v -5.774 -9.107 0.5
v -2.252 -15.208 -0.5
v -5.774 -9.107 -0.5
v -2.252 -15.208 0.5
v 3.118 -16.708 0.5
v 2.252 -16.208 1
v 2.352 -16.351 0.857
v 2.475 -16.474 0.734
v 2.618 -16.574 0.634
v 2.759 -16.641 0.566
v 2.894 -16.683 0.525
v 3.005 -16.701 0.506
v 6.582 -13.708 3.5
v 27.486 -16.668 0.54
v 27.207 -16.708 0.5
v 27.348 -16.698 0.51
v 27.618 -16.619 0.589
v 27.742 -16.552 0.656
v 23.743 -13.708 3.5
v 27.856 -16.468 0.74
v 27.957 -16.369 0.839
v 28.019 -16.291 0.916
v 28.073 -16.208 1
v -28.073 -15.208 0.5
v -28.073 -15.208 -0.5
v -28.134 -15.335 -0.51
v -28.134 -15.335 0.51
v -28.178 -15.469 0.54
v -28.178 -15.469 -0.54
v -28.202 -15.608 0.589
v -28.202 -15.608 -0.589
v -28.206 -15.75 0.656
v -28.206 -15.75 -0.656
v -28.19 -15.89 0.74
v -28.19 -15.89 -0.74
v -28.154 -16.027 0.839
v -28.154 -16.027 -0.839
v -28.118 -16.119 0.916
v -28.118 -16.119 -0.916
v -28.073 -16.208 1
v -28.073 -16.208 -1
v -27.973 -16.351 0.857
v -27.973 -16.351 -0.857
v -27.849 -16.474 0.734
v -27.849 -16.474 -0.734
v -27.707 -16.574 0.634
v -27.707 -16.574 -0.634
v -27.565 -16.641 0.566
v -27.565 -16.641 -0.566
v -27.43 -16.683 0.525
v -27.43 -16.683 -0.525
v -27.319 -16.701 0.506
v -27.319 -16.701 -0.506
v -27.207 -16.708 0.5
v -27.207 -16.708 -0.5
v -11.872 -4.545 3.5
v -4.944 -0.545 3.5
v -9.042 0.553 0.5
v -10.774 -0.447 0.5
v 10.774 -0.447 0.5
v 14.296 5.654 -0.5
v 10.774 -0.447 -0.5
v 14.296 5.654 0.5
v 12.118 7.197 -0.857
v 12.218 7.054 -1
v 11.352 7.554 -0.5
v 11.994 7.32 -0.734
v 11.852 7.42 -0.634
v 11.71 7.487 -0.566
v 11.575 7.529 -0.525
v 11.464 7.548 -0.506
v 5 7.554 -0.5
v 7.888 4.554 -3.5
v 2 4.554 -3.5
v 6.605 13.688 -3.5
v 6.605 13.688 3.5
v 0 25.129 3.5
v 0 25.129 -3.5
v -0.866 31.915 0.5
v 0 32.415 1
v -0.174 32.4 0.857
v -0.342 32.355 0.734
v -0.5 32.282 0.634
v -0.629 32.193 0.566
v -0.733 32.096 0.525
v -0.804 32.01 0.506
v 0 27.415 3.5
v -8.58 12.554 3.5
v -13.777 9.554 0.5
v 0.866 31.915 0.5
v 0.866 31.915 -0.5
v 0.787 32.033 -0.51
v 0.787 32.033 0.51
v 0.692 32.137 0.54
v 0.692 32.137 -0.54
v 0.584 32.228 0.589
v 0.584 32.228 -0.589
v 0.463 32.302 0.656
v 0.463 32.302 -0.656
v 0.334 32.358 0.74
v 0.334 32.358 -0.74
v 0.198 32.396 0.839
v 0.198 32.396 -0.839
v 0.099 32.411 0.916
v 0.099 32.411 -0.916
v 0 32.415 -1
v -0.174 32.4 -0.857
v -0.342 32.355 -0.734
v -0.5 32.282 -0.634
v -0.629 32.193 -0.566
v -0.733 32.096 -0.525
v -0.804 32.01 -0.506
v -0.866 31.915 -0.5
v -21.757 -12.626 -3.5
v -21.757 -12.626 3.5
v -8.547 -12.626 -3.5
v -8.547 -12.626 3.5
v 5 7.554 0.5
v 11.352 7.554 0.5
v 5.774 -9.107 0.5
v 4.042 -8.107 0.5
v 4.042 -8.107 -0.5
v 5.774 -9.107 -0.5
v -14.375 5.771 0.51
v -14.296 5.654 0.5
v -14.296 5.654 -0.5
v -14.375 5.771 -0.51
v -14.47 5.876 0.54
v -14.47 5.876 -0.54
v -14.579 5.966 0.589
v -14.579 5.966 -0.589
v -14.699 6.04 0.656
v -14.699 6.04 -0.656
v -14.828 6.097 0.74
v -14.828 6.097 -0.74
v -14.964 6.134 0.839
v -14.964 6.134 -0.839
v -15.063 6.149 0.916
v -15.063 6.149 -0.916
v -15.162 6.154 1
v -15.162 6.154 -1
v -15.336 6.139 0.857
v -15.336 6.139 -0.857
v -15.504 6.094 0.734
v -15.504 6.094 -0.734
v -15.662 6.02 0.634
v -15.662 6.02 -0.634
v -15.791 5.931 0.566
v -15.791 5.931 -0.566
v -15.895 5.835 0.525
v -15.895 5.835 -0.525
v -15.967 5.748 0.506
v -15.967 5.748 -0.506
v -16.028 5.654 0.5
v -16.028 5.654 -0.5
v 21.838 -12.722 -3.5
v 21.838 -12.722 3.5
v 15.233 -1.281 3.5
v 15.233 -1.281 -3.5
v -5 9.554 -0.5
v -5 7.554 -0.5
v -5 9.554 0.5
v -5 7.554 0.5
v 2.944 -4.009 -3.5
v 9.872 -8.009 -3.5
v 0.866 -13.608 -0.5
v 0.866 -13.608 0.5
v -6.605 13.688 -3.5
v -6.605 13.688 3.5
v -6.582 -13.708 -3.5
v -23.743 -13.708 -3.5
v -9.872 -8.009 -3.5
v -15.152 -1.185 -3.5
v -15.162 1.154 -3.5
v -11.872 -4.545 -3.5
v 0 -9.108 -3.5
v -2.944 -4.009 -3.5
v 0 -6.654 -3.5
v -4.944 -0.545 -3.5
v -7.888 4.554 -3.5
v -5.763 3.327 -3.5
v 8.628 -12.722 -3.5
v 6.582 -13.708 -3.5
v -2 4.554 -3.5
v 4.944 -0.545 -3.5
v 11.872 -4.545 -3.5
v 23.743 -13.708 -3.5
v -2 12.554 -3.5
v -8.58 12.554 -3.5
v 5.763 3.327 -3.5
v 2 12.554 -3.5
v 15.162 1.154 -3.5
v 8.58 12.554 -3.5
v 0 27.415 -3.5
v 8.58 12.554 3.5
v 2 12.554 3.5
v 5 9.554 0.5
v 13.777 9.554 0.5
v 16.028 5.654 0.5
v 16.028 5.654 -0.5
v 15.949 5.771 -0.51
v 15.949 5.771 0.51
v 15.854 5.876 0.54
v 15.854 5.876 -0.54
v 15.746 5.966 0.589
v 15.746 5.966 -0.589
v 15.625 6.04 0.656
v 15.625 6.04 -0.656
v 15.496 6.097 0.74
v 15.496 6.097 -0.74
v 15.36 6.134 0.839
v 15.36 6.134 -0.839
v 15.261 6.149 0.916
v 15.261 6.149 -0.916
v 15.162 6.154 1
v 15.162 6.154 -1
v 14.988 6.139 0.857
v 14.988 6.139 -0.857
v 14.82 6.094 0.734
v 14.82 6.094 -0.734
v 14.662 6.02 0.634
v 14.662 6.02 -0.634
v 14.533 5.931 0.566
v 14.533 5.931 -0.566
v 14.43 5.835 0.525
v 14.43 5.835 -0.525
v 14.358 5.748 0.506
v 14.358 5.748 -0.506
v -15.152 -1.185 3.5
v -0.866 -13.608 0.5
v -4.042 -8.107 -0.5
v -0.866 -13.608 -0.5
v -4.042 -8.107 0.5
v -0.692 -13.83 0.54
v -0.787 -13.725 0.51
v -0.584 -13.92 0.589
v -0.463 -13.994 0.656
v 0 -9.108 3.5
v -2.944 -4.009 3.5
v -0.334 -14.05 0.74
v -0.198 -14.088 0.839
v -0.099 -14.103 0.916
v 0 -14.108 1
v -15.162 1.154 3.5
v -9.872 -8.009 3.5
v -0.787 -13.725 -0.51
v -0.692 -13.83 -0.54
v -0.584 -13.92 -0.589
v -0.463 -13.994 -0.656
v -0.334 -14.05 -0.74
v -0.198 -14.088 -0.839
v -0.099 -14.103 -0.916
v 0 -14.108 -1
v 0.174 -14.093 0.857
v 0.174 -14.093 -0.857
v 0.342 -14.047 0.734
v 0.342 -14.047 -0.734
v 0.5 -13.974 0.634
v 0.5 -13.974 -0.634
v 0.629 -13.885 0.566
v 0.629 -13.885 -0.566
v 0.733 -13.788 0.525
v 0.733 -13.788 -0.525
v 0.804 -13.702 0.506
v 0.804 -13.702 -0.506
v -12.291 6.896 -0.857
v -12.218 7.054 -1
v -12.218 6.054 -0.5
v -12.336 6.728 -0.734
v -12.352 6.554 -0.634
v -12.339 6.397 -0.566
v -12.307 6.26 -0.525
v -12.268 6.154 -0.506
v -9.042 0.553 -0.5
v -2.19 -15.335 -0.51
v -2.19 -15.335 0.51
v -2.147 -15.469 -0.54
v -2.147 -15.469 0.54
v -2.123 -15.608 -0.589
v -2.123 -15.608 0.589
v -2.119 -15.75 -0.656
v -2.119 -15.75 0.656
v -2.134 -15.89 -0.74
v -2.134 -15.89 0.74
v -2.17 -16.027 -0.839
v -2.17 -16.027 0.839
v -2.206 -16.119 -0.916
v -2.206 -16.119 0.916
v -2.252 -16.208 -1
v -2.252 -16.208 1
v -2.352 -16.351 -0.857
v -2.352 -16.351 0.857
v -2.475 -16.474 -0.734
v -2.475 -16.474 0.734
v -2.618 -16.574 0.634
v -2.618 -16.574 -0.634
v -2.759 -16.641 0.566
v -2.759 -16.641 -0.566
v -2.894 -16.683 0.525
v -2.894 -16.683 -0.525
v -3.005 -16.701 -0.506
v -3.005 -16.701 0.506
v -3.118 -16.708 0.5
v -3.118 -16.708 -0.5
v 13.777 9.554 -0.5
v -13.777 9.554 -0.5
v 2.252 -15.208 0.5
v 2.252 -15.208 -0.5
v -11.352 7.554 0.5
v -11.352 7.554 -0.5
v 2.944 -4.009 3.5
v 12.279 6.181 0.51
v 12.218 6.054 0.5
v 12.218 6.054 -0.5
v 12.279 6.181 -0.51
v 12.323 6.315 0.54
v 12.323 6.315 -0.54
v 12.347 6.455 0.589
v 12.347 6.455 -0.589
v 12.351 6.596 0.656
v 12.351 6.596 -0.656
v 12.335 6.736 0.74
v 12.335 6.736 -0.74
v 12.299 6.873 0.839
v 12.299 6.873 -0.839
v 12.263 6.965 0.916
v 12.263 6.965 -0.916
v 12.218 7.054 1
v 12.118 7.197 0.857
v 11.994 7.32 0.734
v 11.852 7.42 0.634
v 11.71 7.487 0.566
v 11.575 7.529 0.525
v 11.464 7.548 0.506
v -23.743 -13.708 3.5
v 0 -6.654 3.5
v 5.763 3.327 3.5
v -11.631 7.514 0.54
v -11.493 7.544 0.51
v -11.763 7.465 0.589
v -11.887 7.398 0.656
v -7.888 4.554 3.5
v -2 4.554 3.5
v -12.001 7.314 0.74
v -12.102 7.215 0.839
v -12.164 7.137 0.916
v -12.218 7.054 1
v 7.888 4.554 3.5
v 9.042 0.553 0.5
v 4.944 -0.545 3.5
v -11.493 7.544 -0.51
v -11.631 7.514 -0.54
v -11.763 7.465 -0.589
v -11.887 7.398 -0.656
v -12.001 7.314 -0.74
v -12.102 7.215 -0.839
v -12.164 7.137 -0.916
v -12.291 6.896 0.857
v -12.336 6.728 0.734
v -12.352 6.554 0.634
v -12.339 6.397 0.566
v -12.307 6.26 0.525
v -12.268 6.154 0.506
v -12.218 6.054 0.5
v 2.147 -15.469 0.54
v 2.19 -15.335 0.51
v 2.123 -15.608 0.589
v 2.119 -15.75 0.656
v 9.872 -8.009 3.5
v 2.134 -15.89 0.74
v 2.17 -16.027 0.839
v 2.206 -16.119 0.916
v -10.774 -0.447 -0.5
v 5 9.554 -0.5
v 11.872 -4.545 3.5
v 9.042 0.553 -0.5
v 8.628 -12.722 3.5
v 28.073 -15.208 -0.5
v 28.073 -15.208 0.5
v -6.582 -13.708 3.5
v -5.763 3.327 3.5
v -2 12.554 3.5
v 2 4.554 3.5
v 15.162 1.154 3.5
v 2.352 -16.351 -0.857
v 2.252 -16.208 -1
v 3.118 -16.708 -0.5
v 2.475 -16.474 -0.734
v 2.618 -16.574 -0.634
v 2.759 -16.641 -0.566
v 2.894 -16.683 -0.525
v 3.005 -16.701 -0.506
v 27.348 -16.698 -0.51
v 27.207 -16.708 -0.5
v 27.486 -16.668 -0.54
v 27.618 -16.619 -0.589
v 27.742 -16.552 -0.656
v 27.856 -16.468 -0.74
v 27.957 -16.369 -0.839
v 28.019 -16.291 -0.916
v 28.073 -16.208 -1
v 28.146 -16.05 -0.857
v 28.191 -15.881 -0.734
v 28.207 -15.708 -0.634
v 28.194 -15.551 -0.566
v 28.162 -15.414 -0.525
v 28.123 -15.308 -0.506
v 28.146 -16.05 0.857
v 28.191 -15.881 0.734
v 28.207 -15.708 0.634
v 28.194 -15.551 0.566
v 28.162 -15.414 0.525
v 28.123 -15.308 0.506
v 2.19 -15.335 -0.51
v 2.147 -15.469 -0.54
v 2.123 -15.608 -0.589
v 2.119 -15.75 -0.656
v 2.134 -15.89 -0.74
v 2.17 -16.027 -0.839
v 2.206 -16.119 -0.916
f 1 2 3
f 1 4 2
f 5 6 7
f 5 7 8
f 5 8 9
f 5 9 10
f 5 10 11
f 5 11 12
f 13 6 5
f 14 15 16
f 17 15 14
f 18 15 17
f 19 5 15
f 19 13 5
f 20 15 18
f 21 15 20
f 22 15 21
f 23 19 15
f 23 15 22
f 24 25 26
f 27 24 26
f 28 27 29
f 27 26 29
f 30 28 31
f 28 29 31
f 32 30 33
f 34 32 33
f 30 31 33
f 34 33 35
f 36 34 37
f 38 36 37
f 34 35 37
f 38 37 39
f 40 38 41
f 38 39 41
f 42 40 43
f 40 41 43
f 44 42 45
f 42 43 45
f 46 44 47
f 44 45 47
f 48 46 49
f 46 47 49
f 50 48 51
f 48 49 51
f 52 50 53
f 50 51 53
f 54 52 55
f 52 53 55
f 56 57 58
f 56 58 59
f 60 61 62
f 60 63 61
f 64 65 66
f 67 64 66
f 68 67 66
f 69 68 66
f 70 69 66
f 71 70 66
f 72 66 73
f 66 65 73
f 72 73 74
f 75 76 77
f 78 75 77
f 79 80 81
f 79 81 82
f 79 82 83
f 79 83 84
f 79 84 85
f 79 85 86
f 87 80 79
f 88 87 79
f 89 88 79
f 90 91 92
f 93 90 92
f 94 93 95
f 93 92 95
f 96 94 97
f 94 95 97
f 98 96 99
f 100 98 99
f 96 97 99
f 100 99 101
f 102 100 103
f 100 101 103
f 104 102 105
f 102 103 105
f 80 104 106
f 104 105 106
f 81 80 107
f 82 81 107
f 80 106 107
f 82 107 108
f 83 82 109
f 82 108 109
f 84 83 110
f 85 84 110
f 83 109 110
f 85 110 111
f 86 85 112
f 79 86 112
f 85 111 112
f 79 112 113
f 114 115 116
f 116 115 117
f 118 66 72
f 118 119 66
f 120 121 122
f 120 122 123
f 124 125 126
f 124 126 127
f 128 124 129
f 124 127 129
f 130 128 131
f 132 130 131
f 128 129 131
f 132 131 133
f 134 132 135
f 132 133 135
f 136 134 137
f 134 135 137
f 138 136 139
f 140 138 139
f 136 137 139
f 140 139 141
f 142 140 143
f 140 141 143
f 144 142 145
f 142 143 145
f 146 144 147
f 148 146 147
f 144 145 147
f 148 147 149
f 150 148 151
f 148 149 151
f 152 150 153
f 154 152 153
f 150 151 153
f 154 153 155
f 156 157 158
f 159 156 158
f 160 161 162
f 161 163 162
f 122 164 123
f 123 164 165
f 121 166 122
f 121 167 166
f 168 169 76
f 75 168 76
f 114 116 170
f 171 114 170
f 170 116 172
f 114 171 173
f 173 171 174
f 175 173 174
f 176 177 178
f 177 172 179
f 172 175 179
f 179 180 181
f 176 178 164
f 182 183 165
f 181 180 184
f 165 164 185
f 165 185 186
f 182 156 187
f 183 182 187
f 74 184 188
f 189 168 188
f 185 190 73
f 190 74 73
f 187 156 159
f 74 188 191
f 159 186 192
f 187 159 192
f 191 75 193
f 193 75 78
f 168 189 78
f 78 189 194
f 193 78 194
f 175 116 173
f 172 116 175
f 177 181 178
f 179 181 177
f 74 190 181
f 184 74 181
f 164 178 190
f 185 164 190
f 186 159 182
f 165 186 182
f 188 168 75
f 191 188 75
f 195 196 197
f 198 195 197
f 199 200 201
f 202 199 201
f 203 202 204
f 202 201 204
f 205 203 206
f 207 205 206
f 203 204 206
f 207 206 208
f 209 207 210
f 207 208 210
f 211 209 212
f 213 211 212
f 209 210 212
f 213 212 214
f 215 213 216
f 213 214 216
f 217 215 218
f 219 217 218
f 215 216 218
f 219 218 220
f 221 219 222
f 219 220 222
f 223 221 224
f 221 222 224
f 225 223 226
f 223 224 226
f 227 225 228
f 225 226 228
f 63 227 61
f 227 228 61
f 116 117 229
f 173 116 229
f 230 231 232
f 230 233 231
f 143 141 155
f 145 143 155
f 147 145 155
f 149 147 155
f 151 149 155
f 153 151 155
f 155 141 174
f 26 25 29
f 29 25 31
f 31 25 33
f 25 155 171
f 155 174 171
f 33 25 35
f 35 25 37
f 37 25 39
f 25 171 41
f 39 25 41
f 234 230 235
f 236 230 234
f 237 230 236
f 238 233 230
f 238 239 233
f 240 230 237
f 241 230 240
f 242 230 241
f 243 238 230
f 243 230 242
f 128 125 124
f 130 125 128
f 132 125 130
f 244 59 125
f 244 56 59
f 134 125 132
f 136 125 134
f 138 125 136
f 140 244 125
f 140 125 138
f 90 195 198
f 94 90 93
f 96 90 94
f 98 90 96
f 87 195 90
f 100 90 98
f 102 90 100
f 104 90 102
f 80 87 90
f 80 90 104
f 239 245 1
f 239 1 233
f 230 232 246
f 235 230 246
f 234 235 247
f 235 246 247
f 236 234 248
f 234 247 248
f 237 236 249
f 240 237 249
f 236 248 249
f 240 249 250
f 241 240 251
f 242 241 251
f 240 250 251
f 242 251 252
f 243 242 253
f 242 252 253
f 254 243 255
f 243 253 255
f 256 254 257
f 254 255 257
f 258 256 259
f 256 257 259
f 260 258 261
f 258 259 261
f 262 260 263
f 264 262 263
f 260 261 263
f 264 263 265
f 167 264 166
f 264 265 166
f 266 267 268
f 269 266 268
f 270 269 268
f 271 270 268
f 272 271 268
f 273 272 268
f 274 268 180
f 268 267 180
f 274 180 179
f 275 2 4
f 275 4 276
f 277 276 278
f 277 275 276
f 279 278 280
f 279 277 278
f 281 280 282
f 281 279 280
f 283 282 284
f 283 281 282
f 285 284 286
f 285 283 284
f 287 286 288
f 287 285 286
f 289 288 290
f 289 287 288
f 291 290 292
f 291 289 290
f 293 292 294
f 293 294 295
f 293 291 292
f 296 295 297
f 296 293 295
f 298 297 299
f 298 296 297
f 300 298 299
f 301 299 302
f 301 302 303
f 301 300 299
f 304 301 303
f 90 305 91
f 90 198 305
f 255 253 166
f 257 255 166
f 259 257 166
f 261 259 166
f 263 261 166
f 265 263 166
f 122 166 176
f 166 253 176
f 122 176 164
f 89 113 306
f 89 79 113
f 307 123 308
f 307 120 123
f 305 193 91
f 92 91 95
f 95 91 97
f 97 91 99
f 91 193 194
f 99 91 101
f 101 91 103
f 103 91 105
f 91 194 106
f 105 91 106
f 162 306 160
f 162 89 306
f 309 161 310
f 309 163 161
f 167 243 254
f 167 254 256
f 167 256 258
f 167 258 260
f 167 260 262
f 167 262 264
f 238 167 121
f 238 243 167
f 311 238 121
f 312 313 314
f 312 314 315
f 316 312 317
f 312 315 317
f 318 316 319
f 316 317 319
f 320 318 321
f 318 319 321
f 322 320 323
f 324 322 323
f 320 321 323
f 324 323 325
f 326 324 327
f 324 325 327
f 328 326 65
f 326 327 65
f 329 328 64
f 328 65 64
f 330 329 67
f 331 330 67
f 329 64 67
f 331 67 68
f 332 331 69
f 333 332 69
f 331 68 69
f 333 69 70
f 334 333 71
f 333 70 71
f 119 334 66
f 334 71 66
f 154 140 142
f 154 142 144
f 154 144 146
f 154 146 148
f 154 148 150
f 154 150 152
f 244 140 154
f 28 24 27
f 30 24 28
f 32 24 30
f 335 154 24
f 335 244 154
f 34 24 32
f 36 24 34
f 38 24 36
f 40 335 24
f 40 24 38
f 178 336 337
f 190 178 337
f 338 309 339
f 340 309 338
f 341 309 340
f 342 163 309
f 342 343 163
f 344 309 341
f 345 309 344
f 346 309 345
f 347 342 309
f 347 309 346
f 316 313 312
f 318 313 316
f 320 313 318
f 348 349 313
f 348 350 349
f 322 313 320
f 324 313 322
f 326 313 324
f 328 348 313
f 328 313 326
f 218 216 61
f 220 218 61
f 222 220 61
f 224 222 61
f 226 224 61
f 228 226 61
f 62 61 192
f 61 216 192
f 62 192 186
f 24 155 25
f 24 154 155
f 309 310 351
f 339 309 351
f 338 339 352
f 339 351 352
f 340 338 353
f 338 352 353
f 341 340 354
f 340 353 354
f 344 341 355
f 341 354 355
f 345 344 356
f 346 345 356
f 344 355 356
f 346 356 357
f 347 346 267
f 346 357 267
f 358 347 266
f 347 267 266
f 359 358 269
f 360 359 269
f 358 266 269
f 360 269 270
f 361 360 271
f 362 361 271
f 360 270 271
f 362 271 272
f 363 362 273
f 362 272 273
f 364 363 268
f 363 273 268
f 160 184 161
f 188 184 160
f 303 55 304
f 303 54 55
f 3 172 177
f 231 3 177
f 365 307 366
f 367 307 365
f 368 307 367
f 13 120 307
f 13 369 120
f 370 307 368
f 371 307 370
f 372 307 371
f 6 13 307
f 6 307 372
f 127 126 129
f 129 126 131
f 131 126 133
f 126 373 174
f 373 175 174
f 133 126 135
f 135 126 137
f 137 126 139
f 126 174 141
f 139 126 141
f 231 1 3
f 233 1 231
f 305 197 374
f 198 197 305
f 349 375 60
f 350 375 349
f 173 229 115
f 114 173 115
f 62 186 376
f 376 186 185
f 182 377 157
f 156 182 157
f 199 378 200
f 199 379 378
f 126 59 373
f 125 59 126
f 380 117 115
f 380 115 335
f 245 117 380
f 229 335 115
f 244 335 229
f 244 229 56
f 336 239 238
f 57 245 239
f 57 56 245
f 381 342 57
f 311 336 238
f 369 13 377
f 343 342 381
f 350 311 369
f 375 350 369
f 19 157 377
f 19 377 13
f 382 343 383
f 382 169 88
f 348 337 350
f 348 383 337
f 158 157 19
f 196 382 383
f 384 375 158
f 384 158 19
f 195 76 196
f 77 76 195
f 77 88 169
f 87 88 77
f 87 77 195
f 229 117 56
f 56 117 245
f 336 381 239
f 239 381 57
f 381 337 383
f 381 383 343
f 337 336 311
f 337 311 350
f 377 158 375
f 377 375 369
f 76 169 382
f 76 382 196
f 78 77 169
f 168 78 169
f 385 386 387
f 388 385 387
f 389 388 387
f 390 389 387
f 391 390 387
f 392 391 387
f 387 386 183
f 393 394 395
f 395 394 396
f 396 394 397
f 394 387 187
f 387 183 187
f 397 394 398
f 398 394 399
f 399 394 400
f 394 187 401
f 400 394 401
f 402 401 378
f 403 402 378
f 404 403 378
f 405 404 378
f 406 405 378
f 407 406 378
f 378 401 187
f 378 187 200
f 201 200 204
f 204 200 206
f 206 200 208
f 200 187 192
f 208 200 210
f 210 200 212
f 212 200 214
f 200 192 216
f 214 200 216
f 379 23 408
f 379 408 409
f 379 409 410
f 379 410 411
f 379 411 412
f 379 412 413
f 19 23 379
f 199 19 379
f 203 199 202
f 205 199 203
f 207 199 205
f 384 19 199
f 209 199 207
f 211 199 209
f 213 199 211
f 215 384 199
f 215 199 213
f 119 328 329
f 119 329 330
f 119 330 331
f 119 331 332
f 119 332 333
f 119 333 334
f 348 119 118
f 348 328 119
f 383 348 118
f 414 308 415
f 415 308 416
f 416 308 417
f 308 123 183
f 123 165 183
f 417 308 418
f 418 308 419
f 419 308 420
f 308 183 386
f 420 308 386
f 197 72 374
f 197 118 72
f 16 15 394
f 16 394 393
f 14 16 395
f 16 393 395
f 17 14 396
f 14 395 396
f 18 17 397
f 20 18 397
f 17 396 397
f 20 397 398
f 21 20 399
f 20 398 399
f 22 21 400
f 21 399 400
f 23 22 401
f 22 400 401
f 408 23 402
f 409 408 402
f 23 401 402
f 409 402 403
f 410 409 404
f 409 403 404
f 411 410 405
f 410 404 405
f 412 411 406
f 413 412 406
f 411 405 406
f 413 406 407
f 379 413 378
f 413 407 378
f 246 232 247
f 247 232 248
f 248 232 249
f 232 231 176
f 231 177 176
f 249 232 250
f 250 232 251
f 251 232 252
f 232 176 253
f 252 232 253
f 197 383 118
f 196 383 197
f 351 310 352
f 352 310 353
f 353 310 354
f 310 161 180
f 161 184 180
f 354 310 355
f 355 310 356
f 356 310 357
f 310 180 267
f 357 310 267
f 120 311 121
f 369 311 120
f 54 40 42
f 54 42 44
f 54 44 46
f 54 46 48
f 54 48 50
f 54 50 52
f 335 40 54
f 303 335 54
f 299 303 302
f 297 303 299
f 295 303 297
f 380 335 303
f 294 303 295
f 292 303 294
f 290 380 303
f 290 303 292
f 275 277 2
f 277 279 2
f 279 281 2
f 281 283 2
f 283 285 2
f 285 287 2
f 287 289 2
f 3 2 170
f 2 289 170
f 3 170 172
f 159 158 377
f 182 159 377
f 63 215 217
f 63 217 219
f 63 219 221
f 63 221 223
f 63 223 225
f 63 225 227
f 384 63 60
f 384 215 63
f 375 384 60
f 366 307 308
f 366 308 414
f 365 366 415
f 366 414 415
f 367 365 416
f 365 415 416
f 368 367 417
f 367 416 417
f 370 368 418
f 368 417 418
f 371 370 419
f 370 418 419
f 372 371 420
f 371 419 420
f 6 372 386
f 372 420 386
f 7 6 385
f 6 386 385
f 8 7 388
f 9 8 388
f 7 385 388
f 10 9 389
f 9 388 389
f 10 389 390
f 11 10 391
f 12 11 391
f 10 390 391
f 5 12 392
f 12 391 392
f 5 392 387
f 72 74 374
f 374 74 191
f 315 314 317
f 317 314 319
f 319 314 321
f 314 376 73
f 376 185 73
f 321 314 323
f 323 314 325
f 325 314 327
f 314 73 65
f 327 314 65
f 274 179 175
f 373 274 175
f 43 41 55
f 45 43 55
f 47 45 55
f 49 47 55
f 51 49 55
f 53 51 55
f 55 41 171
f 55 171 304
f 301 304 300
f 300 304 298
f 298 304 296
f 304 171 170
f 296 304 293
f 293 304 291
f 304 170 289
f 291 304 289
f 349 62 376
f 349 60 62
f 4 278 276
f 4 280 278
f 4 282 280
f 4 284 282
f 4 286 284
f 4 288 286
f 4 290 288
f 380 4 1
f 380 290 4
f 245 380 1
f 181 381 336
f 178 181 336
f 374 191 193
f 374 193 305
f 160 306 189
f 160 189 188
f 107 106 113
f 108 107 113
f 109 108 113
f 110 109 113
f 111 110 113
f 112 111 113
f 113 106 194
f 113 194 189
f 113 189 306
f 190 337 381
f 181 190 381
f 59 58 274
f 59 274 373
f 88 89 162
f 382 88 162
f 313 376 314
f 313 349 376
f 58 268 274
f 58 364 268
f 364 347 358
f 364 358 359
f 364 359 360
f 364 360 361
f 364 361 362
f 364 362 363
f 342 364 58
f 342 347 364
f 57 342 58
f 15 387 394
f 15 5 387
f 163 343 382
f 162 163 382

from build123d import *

# Parameters (mm, degrees)
F0_W     = 5
F0_H     = 2
F1_DEPTH = 3.5
F2_SIZE  = 3
F3_R     = 1
F6_DEPTH = 9.2


with BuildPart() as f1:
    # F0 (on Top) → F1 (new body)
    with BuildSketch(Plane.XY):
        Polygon((-4.0418434781, -8.107062112), (0, -15.1077403724), (0, 7.5538701862), (-5, 7.5538701862), (-13.0836869563, 7.5538701862), (-9.0418434781, 0.5531919258), (-6.5418434781, -3.7769350931), align=None)
        Polygon((0, 7.5538701862), (0, -15.1077403724), (4.0418434781, -8.107062112), (6.5418434781, -3.7769350931), (9.0418434781, 0.5531919258), (13.0836869563, 7.5538701862), (5, 7.5538701862), align=None)
        Polygon((-10.7738942857, -0.4468080742), (-8.2738942857, -4.7769350931), (-6.5418434781, -3.7769350931), (-9.0418434781, 0.5531919258), align=None)
        Polygon((-8.2738942857, -4.7769350931), (-5.7738942857, -9.107062112), (-4.0418434781, -8.107062112), (-6.5418434781, -3.7769350931), align=None)
        Polygon((8.2738942857, -4.7769350931), (10.7738942857, -0.4468080742), (9.0418434781, 0.5531919258), (6.5418434781, -3.7769350931), align=None)
        Polygon((4.0418434781, -8.107062112), (5.7738942857, -9.107062112), (8.2738942857, -4.7769350931), (6.5418434781, -3.7769350931), align=None)
        with Locations((2.5, 8.5538701862)):
            Rectangle(F0_W, F0_H)
        with Locations((-2.5, 8.5538701862)):
            Rectangle(F0_W, F0_H)
        Polygon((-28.9386550611, -16.7077402895), (-1.3856406939, -16.7077402895), (-5.7738942857, -9.107062112), (-8.2738942857, -4.7769350931), (-10.7738942857, -0.4468080742), (-15.1621478775, 7.1538701033), align=None)
        Polygon((5.7738942857, -9.107062112), (1.3856406939, -16.7077402895), (28.9386550611, -16.7077402895), (15.1621478775, 7.1538701033), (10.7738942857, -0.4468080742), (8.2738942857, -4.7769350931), align=None)
        Polygon((5, 9.5538701862), (13.7765071836, 9.5538701862), (0, 33.415480579), (0, 9.5538701862), align=None)
        Polygon((0, 9.5538701862), (0, 33.415480579), (-13.7765071836, 9.5538701862), (-5, 9.5538701862), align=None)
    extrude(amount=F1_DEPTH)

    # F2
    f2_edges = [f1.edges().sort_by_distance(p)[0] for p in [
        (-11.062765, 4.053531, 3.5),
        (-9.907869, 0.053192, 3.5),
        (-12.968021, 3.353531, 3.5),
        (-22.050401, -4.776935, 3.5),
        (-15.162148, -16.70774, 3.5),
        (-3.579767, -12.907401, 3.5),
        (-4.907869, -8.607062, 3.5),
        (-2.020922, -11.607401, 3.5),
        (2.020922, -11.607401, 3.5),
        (4.907869, -8.607062, 3.5),
        (3.579767, -12.907401, 3.5),
        (15.162148, -16.70774, 3.5),
        (22.050401, -4.776935, 3.5),
        (12.968021, 3.353531, 3.5),
        (9.907869, 0.053192, 3.5),
        (11.062765, 4.053531, 3.5),
        (9.041843, 7.55387, 3.5),
        (5, 8.55387, 3.5),
        (9.388254, 9.55387, 3.5),
        (6.888254, 21.484675, 3.5),
        (-6.888254, 21.484675, 3.5),
        (-9.388254, 9.55387, 3.5),
        (-5, 8.55387, 3.5),
        (-9.041843, 7.55387, 3.5),
    ]]
    chamfer(f2_edges, length=F2_SIZE)

    # F3
    f3_edges = [f1.edges().sort_by_distance(p)[0] for p in [
        (-28.938655, -16.70774, 0.25),
        (28.938655, -16.70774, 0.25),
        (0, 33.415481, 0.25),
        (-15.162148, 7.15387, 0.25),
        (15.162148, 7.15387, 0.25),
        (-1.385641, -16.70774, 0.25),
        (1.385641, -16.70774, 0.25),
        (-13.083687, 7.55387, 0.25),
        (13.083687, 7.55387, 0.25),
        (0, -15.10774, 0.25),
    ]]
    fillet(f3_edges, radius=F3_R)

    # F4: F1 across plane


with BuildPart() as f1_1:
    add(f1.part)
    add(f1.part.mirror(Plane.XY))

    # F5 (on face) → F6 (cut)
    with BuildSketch(Plane.XY.offset(3.5)):
        Polygon((-6.6051743925, 13.6882647859), (6.6051743925, 13.6882647859), (0, 25.1287624265), align=None)
        Polygon((-21.7569312081, -12.6255113644), (-8.5465824232, -12.6255113644), (-15.1517568156, -1.1850137238), align=None)
        Polygon((8.6276847869, -12.7216648323), (21.8380335718, -12.7216648323), (15.2328591794, -1.2811671917), align=None)
        Polygon((-5.7627101947, 3.3271022821), (0, -6.6542045643), (5.7627101947, 3.3271022821), align=None)
    extrude(amount=-F6_DEPTH, mode=Mode.SUBTRACT)


solid = f1_1.part
